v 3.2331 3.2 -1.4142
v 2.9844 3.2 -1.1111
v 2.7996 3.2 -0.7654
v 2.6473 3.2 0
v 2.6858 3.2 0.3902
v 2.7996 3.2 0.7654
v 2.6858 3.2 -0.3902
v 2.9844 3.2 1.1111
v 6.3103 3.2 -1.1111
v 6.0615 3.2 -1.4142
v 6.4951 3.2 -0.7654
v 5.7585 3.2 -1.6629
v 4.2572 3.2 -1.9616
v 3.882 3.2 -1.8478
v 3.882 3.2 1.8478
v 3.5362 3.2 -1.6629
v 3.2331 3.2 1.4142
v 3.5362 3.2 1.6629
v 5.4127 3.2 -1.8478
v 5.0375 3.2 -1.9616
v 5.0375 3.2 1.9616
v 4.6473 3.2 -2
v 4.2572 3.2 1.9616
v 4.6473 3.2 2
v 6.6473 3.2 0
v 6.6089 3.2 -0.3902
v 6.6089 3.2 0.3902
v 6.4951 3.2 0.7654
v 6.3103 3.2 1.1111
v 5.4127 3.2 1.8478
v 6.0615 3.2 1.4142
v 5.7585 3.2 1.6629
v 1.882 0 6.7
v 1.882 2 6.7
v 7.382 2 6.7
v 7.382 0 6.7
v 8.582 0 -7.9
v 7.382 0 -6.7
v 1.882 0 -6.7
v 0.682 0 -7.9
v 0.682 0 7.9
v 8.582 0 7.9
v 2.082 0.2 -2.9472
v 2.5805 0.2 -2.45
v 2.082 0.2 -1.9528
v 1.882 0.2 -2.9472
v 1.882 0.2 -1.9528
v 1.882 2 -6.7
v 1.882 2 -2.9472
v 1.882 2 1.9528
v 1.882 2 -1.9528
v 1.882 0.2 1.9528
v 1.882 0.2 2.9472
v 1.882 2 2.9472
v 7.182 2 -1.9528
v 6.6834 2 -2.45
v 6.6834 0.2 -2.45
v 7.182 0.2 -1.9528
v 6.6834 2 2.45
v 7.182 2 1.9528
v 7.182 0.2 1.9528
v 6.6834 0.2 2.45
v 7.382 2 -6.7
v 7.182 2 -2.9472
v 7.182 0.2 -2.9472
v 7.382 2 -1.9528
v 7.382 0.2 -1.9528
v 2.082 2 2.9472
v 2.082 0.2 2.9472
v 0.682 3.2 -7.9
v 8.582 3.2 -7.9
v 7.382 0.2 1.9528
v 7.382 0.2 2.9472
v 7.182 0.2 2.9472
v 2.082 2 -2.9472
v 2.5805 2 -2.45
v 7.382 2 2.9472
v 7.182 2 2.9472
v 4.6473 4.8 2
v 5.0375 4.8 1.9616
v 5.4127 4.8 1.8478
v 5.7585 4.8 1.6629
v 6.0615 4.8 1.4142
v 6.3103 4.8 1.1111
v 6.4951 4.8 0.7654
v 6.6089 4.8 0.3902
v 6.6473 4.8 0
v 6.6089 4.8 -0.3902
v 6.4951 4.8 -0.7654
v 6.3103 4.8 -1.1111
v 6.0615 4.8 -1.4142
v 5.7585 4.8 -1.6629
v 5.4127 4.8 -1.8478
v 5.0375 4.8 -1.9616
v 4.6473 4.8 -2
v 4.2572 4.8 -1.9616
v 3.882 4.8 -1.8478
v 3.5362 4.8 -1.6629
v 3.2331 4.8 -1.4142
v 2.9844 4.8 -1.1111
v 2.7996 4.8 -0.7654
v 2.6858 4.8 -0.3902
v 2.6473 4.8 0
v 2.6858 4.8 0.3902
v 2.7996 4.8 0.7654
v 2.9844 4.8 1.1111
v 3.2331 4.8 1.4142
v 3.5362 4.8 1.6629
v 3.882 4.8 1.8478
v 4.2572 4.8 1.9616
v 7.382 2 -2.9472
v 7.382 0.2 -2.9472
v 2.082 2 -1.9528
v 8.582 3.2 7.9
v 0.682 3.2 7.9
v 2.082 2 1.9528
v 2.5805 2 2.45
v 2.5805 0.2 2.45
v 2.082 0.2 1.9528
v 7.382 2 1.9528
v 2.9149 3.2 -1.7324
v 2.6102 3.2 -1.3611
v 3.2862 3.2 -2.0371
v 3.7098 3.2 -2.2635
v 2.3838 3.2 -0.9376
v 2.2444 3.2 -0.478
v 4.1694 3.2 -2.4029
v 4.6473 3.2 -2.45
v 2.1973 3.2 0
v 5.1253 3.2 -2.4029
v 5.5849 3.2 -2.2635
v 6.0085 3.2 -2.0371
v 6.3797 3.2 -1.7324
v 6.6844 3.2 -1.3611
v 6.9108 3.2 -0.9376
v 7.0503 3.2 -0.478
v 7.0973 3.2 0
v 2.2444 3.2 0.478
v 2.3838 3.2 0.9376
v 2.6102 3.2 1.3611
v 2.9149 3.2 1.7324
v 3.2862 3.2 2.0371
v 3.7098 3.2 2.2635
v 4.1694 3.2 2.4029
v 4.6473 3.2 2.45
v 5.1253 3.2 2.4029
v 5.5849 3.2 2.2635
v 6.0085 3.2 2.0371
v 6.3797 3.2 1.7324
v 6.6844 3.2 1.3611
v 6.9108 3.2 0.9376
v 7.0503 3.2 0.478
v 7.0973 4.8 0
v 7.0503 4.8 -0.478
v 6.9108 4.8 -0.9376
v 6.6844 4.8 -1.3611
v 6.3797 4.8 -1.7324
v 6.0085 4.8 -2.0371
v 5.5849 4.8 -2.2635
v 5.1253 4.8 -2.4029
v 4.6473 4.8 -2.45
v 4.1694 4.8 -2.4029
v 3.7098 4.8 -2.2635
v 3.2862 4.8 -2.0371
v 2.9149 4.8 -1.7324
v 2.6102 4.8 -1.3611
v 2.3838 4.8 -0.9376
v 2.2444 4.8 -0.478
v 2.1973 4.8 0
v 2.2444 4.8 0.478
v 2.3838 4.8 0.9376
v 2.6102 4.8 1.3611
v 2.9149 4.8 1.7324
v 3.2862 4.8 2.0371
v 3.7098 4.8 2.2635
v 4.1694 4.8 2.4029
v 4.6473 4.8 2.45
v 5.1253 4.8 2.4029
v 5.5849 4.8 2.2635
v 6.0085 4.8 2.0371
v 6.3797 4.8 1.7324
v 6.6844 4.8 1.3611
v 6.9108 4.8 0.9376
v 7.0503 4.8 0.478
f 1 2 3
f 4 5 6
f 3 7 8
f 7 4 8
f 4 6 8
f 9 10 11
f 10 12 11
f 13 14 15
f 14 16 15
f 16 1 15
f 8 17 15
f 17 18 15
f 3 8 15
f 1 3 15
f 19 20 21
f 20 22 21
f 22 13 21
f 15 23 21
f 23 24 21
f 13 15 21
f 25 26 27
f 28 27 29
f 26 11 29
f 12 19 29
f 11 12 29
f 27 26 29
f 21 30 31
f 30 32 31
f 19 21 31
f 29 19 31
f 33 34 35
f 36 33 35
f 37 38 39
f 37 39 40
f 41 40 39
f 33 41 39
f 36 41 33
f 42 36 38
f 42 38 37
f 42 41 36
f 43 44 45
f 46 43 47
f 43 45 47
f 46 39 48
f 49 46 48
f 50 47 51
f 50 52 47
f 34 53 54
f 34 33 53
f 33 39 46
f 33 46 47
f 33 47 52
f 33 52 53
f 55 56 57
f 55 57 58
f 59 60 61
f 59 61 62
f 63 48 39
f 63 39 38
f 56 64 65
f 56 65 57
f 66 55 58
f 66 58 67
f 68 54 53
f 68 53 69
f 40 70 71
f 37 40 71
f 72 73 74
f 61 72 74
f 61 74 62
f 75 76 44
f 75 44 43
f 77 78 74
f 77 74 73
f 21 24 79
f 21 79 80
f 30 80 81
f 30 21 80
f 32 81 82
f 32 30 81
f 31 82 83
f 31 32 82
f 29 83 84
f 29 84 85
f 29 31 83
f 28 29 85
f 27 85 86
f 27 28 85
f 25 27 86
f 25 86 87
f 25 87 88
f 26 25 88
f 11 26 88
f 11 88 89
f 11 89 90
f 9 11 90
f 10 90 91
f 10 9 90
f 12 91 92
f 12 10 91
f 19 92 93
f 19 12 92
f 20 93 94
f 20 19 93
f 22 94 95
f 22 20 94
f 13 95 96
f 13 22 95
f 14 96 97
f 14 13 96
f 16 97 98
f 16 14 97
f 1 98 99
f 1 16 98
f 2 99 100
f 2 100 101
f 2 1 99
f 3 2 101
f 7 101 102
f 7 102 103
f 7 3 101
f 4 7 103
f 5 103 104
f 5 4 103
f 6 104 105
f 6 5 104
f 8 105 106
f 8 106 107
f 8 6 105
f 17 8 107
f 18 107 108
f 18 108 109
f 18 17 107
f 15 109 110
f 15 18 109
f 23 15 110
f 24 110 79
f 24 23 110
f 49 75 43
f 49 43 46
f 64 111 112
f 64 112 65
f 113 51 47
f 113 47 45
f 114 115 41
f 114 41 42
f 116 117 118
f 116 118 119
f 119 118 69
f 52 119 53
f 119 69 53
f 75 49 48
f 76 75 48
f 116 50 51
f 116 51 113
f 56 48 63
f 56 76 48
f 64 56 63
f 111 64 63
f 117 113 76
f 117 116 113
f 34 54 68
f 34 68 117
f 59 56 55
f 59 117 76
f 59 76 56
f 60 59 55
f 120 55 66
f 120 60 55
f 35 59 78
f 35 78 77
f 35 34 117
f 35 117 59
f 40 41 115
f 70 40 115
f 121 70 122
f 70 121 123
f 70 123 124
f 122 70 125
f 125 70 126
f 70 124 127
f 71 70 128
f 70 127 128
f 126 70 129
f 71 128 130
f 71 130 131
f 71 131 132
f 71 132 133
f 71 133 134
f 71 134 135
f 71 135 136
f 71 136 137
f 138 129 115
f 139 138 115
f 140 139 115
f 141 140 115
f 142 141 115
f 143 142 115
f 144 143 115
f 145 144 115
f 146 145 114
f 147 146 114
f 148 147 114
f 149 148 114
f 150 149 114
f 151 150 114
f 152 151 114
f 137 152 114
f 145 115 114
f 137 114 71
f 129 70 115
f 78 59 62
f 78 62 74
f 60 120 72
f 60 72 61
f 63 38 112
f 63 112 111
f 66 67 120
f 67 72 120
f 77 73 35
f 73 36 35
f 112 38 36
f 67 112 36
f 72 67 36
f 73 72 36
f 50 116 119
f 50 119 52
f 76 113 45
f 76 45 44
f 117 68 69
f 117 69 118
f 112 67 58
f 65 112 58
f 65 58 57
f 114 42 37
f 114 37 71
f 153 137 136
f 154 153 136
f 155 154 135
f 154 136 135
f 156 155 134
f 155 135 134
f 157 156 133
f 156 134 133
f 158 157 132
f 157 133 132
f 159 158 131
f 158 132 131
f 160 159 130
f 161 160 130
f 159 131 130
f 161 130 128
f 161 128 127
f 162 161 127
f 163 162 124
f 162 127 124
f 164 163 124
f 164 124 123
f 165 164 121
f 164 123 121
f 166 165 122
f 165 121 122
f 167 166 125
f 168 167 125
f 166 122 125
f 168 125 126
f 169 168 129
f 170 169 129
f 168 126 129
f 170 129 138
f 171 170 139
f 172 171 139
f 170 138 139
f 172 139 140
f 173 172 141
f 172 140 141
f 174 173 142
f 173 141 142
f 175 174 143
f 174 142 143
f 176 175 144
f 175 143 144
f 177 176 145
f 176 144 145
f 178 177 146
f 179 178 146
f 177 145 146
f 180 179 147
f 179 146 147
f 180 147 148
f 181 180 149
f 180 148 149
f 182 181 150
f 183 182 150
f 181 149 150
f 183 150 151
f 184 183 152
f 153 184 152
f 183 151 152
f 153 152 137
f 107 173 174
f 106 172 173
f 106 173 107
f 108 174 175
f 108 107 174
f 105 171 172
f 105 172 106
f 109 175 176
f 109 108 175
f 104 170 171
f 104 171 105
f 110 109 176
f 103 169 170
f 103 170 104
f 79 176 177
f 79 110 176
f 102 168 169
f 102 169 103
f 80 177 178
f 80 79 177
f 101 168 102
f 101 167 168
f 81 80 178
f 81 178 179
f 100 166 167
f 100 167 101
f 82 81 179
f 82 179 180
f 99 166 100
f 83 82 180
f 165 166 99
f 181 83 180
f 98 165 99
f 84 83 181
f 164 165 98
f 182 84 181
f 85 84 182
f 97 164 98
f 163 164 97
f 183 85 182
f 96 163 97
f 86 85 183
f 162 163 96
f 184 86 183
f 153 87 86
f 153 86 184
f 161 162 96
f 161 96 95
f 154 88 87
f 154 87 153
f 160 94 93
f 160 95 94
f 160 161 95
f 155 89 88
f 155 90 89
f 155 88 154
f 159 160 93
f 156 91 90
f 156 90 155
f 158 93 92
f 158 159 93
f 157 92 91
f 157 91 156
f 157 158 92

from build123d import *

# Parameters (mm, degrees)
MAINBASESKETCH_W                 = 7.9
MAINBASESKETCH_H                 = 3.2
MAINBASEEXTRUDE_DEPTH            = 7.9
MAINBASESHELL_T                  = -1.2
SLIMYELLOWUNDEREXT_START         = -0.2
SLIMYELLOWUNDEREXT_DEPTH         = 2
SLIMYELLLOWUPPERCIRCLESKETCH_R   = 2.45
SLIMYELLLOWUPPERCIRCLESKETCH_R_2 = 2
SLIMYELLOWUPPERCIRCLE_DEPTH      = 1.6


with BuildPart() as part:
    # MainBaseSketch → MainBaseExtrude (new, symmetric)
    with BuildSketch(Plane.XY):
        with Locations((4.631967213, 1.6)):
            Rectangle(MAINBASESKETCH_W, MAINBASESKETCH_H)
    extrude(amount=MAINBASEEXTRUDE_DEPTH, both=True)

    # MainBaseShell
    mainbaseshell_openings = [part.faces().sort_by_distance(p)[0] for p in [
        (4.631967213, 0, 0),
    ]]
    offset(amount=MAINBASESHELL_T, openings=mainbaseshell_openings, kind=Kind.INTERSECTION)

    # SlimYellowUnderExtSketch → SlimYellowUnderExt (add)
    with BuildSketch(Plane.XZ.offset(-2).offset(SLIMYELLOWUNDEREXT_START)):
        Polygon((6.683445552, 2.45), (7.181967213, 2.947188682), (7.381967213, 2.947188682), (7.381967213, 1.952811318), (7.181967213, 1.952811318), align=None)
        Polygon((1.881967213, 1.952811318), (1.881967213, 2.947188682), (2.081967213, 2.947188682), (2.580488874, 2.45), (2.081967213, 1.952811318), align=None)
        Polygon((2.580488874, -2.45), (2.081967213, -2.947188682), (1.881967213, -2.947188682), (1.881967213, -1.952811318), (2.081967213, -1.952811318), align=None)
        Polygon((6.683445552, -2.45), (7.181967213, -1.952811318), (7.381967213, -1.952811318), (7.381967213, -2.947188682), (7.181967213, -2.947188682), align=None)
    extrude(amount=SLIMYELLOWUNDEREXT_DEPTH)

    # SlimYelllowUpperCircleSketch → SlimYellowUpperCircle (add)
    with BuildSketch(Plane(origin=(0, 3.2, 0), x_dir=(1, 0, 0), z_dir=(0, 1, 0))):
        with Locations((4.647335619, 0)):
            Circle(SLIMYELLLOWUPPERCIRCLESKETCH_R)
        with Locations(Location((4.647335619, 0, 0), (0, 0, 270))):
            Circle(SLIMYELLLOWUPPERCIRCLESKETCH_R_2, mode=Mode.SUBTRACT)
    extrude(amount=SLIMYELLOWUPPERCIRCLE_DEPTH)


solid = part.part
